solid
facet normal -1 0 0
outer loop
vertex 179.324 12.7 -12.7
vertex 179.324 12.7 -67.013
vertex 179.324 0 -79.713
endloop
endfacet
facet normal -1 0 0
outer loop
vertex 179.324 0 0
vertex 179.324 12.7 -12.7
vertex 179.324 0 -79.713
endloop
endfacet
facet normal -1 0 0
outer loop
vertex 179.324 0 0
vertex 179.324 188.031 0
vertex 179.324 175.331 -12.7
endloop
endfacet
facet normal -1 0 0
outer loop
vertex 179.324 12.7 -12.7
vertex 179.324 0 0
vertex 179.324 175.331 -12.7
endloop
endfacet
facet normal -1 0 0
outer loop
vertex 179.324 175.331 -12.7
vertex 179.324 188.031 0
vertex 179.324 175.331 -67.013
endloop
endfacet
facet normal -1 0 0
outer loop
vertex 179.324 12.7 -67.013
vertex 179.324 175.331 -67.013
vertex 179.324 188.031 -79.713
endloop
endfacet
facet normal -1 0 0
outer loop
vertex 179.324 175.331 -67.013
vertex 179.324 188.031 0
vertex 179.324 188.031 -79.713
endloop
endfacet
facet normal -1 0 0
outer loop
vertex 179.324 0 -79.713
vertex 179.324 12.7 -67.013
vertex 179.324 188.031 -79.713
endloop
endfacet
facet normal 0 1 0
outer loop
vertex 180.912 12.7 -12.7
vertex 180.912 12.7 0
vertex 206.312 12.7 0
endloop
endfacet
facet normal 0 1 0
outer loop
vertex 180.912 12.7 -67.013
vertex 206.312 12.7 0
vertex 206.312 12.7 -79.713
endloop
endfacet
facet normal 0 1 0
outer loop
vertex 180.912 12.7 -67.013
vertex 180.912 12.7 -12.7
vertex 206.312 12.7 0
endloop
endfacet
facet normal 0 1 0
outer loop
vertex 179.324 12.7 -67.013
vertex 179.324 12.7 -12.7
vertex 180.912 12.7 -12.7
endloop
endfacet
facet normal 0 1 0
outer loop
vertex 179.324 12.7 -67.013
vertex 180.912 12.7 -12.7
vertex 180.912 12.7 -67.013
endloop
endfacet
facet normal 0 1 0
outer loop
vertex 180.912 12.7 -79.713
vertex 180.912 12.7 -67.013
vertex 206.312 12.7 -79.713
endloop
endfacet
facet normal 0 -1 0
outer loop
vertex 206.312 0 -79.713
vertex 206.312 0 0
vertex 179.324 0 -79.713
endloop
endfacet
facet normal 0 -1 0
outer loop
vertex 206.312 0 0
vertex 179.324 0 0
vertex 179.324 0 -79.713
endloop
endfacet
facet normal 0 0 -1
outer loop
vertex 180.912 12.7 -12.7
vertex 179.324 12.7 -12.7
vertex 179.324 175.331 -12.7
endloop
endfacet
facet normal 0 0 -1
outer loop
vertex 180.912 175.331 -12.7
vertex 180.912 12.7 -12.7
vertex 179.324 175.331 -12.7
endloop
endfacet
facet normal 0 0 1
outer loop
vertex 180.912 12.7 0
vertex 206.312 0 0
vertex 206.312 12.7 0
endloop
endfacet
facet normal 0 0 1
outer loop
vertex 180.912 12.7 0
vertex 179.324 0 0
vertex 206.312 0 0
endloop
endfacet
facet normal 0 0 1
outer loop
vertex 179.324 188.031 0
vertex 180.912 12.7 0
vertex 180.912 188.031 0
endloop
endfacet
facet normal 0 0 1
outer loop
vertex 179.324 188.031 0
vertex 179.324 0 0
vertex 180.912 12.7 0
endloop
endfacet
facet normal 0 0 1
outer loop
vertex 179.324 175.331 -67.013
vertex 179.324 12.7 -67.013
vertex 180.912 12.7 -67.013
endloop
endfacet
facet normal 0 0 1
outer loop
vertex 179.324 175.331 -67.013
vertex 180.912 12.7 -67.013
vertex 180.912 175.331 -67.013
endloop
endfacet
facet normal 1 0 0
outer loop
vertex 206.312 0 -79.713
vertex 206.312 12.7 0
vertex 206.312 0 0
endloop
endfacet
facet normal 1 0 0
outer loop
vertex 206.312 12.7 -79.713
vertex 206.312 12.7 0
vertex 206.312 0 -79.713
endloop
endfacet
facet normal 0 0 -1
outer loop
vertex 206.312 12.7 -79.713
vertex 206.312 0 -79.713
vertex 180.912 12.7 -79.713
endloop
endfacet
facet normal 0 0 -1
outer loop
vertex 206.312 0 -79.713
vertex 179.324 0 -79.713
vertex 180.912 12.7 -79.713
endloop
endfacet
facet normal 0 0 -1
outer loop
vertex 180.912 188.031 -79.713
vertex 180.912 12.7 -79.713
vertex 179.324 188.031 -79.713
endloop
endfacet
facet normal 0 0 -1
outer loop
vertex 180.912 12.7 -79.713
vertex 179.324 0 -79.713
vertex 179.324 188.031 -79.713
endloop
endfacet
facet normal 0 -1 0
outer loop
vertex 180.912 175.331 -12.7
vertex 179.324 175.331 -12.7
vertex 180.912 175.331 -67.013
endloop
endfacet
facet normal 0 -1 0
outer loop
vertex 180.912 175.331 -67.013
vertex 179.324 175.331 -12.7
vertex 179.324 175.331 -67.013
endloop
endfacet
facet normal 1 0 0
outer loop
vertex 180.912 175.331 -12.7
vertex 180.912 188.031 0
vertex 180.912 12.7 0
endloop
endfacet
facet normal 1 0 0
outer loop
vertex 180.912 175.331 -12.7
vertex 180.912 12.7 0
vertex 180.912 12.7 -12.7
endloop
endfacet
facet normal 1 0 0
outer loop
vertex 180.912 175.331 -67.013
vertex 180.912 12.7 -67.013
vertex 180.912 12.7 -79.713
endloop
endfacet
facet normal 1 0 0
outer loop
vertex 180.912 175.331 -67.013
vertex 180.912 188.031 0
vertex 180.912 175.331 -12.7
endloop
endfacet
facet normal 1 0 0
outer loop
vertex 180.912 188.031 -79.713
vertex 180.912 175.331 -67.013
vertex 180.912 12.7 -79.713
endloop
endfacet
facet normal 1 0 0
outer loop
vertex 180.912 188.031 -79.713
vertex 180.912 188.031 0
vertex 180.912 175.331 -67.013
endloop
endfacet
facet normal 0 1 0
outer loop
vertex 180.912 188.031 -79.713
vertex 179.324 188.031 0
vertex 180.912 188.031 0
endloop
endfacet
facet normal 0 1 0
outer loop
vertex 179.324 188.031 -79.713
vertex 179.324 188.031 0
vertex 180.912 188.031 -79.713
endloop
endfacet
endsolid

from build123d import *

# Parameters (mm, degrees)
SKETCH1_W           = 79.713100929
SKETCH1_H           = 188.030607332
SKETCH1_W_2         = 54.313100929
SKETCH1_H_2         = 162.630607332
EXTRUDE_THIN1_DEPTH = 1.5875
EXTRUDE_THIN2_START = -179.324
SKETCH1_3_W         = 79.713100929
SKETCH1_3_H         = 188.030607332
SKETCH1_3_W_2       = 54.313100929
SKETCH1_3_H_2       = 162.630607332
EXTRUDE_THIN2_DEPTH = 1.5875
SKETCH2_W           = 79.713100929
SKETCH2_H           = 12.7
BOSS_EXTRUDE3_DEPTH = 25.4
BOSS_EXTRUDE4_START = -182.499
SKETCH2_2_W         = 79.713100929
SKETCH2_2_H         = 12.7
BOSS_EXTRUDE4_DEPTH = 25.4
SKETCH3_W           = 117.076053855
SKETCH3_H           = 196.691722882
CUT_EXTRUDE1_DEPTH  = 291.300056469


with BuildPart() as part:
    # Sketch1 → Extrude-Thin1 (new body)
    with BuildSketch(Plane(origin=(179.324, 0, 0), x_dir=(0, 0, -1), z_dir=(1, 0, 0))):
        with Locations((39.856550465, 94.015303666)):
            Rectangle(SKETCH1_W, SKETCH1_H)
        with Locations((39.856550465, 94.015303666)):
            Rectangle(SKETCH1_W_2, SKETCH1_H_2, mode=Mode.SUBTRACT)
    extrude(amount=EXTRUDE_THIN1_DEPTH)

    # Sketch2 → Boss-Extrude3 (add)
    with BuildSketch(Plane(origin=(180.9115, 0, 0), x_dir=(0, 0, -1), z_dir=(1, 0, 0))):
        with Locations((39.856550465, 6.35)):
            Rectangle(SKETCH2_W, SKETCH2_H)
    extrude(amount=BOSS_EXTRUDE3_DEPTH)


with BuildPart() as body_2:
    # Sketch1<3> → Extrude-Thin2 (new body)
    with BuildSketch(Plane(origin=(179.324, 0, 0), x_dir=(0, 0, -1), z_dir=(1, 0, 0)).offset(EXTRUDE_THIN2_START)):
        with Locations((39.856550465, 94.015303666)):
            Rectangle(SKETCH1_3_W, SKETCH1_3_H)
        with Locations((39.856550465, 94.015303666)):
            Rectangle(SKETCH1_3_W_2, SKETCH1_3_H_2, mode=Mode.SUBTRACT)
    extrude(amount=-EXTRUDE_THIN2_DEPTH)

    # Sketch2<2> → Boss-Extrude4 (add)
    with BuildSketch(Plane(origin=(180.9115, 0, 0), x_dir=(0, 0, -1), z_dir=(1, 0, 0)).offset(BOSS_EXTRUDE4_START)):
        with Locations((39.856550465, 6.35)):
            Rectangle(SKETCH2_2_W, SKETCH2_2_H)
    extrude(amount=-BOSS_EXTRUDE4_DEPTH)

    # Sketch3 → Cut-Extrude1 (cut, through all)
    with BuildSketch(Plane(origin=(0, 0, 0), x_dir=(0, 0, -1), z_dir=(1, 0, 0))):
        with Locations((58.538026928, 98.345861441)):
            Rectangle(SKETCH3_W, SKETCH3_H)
    extrude(amount=-CUT_EXTRUDE1_DEPTH, mode=Mode.SUBTRACT)


solid = part.part
